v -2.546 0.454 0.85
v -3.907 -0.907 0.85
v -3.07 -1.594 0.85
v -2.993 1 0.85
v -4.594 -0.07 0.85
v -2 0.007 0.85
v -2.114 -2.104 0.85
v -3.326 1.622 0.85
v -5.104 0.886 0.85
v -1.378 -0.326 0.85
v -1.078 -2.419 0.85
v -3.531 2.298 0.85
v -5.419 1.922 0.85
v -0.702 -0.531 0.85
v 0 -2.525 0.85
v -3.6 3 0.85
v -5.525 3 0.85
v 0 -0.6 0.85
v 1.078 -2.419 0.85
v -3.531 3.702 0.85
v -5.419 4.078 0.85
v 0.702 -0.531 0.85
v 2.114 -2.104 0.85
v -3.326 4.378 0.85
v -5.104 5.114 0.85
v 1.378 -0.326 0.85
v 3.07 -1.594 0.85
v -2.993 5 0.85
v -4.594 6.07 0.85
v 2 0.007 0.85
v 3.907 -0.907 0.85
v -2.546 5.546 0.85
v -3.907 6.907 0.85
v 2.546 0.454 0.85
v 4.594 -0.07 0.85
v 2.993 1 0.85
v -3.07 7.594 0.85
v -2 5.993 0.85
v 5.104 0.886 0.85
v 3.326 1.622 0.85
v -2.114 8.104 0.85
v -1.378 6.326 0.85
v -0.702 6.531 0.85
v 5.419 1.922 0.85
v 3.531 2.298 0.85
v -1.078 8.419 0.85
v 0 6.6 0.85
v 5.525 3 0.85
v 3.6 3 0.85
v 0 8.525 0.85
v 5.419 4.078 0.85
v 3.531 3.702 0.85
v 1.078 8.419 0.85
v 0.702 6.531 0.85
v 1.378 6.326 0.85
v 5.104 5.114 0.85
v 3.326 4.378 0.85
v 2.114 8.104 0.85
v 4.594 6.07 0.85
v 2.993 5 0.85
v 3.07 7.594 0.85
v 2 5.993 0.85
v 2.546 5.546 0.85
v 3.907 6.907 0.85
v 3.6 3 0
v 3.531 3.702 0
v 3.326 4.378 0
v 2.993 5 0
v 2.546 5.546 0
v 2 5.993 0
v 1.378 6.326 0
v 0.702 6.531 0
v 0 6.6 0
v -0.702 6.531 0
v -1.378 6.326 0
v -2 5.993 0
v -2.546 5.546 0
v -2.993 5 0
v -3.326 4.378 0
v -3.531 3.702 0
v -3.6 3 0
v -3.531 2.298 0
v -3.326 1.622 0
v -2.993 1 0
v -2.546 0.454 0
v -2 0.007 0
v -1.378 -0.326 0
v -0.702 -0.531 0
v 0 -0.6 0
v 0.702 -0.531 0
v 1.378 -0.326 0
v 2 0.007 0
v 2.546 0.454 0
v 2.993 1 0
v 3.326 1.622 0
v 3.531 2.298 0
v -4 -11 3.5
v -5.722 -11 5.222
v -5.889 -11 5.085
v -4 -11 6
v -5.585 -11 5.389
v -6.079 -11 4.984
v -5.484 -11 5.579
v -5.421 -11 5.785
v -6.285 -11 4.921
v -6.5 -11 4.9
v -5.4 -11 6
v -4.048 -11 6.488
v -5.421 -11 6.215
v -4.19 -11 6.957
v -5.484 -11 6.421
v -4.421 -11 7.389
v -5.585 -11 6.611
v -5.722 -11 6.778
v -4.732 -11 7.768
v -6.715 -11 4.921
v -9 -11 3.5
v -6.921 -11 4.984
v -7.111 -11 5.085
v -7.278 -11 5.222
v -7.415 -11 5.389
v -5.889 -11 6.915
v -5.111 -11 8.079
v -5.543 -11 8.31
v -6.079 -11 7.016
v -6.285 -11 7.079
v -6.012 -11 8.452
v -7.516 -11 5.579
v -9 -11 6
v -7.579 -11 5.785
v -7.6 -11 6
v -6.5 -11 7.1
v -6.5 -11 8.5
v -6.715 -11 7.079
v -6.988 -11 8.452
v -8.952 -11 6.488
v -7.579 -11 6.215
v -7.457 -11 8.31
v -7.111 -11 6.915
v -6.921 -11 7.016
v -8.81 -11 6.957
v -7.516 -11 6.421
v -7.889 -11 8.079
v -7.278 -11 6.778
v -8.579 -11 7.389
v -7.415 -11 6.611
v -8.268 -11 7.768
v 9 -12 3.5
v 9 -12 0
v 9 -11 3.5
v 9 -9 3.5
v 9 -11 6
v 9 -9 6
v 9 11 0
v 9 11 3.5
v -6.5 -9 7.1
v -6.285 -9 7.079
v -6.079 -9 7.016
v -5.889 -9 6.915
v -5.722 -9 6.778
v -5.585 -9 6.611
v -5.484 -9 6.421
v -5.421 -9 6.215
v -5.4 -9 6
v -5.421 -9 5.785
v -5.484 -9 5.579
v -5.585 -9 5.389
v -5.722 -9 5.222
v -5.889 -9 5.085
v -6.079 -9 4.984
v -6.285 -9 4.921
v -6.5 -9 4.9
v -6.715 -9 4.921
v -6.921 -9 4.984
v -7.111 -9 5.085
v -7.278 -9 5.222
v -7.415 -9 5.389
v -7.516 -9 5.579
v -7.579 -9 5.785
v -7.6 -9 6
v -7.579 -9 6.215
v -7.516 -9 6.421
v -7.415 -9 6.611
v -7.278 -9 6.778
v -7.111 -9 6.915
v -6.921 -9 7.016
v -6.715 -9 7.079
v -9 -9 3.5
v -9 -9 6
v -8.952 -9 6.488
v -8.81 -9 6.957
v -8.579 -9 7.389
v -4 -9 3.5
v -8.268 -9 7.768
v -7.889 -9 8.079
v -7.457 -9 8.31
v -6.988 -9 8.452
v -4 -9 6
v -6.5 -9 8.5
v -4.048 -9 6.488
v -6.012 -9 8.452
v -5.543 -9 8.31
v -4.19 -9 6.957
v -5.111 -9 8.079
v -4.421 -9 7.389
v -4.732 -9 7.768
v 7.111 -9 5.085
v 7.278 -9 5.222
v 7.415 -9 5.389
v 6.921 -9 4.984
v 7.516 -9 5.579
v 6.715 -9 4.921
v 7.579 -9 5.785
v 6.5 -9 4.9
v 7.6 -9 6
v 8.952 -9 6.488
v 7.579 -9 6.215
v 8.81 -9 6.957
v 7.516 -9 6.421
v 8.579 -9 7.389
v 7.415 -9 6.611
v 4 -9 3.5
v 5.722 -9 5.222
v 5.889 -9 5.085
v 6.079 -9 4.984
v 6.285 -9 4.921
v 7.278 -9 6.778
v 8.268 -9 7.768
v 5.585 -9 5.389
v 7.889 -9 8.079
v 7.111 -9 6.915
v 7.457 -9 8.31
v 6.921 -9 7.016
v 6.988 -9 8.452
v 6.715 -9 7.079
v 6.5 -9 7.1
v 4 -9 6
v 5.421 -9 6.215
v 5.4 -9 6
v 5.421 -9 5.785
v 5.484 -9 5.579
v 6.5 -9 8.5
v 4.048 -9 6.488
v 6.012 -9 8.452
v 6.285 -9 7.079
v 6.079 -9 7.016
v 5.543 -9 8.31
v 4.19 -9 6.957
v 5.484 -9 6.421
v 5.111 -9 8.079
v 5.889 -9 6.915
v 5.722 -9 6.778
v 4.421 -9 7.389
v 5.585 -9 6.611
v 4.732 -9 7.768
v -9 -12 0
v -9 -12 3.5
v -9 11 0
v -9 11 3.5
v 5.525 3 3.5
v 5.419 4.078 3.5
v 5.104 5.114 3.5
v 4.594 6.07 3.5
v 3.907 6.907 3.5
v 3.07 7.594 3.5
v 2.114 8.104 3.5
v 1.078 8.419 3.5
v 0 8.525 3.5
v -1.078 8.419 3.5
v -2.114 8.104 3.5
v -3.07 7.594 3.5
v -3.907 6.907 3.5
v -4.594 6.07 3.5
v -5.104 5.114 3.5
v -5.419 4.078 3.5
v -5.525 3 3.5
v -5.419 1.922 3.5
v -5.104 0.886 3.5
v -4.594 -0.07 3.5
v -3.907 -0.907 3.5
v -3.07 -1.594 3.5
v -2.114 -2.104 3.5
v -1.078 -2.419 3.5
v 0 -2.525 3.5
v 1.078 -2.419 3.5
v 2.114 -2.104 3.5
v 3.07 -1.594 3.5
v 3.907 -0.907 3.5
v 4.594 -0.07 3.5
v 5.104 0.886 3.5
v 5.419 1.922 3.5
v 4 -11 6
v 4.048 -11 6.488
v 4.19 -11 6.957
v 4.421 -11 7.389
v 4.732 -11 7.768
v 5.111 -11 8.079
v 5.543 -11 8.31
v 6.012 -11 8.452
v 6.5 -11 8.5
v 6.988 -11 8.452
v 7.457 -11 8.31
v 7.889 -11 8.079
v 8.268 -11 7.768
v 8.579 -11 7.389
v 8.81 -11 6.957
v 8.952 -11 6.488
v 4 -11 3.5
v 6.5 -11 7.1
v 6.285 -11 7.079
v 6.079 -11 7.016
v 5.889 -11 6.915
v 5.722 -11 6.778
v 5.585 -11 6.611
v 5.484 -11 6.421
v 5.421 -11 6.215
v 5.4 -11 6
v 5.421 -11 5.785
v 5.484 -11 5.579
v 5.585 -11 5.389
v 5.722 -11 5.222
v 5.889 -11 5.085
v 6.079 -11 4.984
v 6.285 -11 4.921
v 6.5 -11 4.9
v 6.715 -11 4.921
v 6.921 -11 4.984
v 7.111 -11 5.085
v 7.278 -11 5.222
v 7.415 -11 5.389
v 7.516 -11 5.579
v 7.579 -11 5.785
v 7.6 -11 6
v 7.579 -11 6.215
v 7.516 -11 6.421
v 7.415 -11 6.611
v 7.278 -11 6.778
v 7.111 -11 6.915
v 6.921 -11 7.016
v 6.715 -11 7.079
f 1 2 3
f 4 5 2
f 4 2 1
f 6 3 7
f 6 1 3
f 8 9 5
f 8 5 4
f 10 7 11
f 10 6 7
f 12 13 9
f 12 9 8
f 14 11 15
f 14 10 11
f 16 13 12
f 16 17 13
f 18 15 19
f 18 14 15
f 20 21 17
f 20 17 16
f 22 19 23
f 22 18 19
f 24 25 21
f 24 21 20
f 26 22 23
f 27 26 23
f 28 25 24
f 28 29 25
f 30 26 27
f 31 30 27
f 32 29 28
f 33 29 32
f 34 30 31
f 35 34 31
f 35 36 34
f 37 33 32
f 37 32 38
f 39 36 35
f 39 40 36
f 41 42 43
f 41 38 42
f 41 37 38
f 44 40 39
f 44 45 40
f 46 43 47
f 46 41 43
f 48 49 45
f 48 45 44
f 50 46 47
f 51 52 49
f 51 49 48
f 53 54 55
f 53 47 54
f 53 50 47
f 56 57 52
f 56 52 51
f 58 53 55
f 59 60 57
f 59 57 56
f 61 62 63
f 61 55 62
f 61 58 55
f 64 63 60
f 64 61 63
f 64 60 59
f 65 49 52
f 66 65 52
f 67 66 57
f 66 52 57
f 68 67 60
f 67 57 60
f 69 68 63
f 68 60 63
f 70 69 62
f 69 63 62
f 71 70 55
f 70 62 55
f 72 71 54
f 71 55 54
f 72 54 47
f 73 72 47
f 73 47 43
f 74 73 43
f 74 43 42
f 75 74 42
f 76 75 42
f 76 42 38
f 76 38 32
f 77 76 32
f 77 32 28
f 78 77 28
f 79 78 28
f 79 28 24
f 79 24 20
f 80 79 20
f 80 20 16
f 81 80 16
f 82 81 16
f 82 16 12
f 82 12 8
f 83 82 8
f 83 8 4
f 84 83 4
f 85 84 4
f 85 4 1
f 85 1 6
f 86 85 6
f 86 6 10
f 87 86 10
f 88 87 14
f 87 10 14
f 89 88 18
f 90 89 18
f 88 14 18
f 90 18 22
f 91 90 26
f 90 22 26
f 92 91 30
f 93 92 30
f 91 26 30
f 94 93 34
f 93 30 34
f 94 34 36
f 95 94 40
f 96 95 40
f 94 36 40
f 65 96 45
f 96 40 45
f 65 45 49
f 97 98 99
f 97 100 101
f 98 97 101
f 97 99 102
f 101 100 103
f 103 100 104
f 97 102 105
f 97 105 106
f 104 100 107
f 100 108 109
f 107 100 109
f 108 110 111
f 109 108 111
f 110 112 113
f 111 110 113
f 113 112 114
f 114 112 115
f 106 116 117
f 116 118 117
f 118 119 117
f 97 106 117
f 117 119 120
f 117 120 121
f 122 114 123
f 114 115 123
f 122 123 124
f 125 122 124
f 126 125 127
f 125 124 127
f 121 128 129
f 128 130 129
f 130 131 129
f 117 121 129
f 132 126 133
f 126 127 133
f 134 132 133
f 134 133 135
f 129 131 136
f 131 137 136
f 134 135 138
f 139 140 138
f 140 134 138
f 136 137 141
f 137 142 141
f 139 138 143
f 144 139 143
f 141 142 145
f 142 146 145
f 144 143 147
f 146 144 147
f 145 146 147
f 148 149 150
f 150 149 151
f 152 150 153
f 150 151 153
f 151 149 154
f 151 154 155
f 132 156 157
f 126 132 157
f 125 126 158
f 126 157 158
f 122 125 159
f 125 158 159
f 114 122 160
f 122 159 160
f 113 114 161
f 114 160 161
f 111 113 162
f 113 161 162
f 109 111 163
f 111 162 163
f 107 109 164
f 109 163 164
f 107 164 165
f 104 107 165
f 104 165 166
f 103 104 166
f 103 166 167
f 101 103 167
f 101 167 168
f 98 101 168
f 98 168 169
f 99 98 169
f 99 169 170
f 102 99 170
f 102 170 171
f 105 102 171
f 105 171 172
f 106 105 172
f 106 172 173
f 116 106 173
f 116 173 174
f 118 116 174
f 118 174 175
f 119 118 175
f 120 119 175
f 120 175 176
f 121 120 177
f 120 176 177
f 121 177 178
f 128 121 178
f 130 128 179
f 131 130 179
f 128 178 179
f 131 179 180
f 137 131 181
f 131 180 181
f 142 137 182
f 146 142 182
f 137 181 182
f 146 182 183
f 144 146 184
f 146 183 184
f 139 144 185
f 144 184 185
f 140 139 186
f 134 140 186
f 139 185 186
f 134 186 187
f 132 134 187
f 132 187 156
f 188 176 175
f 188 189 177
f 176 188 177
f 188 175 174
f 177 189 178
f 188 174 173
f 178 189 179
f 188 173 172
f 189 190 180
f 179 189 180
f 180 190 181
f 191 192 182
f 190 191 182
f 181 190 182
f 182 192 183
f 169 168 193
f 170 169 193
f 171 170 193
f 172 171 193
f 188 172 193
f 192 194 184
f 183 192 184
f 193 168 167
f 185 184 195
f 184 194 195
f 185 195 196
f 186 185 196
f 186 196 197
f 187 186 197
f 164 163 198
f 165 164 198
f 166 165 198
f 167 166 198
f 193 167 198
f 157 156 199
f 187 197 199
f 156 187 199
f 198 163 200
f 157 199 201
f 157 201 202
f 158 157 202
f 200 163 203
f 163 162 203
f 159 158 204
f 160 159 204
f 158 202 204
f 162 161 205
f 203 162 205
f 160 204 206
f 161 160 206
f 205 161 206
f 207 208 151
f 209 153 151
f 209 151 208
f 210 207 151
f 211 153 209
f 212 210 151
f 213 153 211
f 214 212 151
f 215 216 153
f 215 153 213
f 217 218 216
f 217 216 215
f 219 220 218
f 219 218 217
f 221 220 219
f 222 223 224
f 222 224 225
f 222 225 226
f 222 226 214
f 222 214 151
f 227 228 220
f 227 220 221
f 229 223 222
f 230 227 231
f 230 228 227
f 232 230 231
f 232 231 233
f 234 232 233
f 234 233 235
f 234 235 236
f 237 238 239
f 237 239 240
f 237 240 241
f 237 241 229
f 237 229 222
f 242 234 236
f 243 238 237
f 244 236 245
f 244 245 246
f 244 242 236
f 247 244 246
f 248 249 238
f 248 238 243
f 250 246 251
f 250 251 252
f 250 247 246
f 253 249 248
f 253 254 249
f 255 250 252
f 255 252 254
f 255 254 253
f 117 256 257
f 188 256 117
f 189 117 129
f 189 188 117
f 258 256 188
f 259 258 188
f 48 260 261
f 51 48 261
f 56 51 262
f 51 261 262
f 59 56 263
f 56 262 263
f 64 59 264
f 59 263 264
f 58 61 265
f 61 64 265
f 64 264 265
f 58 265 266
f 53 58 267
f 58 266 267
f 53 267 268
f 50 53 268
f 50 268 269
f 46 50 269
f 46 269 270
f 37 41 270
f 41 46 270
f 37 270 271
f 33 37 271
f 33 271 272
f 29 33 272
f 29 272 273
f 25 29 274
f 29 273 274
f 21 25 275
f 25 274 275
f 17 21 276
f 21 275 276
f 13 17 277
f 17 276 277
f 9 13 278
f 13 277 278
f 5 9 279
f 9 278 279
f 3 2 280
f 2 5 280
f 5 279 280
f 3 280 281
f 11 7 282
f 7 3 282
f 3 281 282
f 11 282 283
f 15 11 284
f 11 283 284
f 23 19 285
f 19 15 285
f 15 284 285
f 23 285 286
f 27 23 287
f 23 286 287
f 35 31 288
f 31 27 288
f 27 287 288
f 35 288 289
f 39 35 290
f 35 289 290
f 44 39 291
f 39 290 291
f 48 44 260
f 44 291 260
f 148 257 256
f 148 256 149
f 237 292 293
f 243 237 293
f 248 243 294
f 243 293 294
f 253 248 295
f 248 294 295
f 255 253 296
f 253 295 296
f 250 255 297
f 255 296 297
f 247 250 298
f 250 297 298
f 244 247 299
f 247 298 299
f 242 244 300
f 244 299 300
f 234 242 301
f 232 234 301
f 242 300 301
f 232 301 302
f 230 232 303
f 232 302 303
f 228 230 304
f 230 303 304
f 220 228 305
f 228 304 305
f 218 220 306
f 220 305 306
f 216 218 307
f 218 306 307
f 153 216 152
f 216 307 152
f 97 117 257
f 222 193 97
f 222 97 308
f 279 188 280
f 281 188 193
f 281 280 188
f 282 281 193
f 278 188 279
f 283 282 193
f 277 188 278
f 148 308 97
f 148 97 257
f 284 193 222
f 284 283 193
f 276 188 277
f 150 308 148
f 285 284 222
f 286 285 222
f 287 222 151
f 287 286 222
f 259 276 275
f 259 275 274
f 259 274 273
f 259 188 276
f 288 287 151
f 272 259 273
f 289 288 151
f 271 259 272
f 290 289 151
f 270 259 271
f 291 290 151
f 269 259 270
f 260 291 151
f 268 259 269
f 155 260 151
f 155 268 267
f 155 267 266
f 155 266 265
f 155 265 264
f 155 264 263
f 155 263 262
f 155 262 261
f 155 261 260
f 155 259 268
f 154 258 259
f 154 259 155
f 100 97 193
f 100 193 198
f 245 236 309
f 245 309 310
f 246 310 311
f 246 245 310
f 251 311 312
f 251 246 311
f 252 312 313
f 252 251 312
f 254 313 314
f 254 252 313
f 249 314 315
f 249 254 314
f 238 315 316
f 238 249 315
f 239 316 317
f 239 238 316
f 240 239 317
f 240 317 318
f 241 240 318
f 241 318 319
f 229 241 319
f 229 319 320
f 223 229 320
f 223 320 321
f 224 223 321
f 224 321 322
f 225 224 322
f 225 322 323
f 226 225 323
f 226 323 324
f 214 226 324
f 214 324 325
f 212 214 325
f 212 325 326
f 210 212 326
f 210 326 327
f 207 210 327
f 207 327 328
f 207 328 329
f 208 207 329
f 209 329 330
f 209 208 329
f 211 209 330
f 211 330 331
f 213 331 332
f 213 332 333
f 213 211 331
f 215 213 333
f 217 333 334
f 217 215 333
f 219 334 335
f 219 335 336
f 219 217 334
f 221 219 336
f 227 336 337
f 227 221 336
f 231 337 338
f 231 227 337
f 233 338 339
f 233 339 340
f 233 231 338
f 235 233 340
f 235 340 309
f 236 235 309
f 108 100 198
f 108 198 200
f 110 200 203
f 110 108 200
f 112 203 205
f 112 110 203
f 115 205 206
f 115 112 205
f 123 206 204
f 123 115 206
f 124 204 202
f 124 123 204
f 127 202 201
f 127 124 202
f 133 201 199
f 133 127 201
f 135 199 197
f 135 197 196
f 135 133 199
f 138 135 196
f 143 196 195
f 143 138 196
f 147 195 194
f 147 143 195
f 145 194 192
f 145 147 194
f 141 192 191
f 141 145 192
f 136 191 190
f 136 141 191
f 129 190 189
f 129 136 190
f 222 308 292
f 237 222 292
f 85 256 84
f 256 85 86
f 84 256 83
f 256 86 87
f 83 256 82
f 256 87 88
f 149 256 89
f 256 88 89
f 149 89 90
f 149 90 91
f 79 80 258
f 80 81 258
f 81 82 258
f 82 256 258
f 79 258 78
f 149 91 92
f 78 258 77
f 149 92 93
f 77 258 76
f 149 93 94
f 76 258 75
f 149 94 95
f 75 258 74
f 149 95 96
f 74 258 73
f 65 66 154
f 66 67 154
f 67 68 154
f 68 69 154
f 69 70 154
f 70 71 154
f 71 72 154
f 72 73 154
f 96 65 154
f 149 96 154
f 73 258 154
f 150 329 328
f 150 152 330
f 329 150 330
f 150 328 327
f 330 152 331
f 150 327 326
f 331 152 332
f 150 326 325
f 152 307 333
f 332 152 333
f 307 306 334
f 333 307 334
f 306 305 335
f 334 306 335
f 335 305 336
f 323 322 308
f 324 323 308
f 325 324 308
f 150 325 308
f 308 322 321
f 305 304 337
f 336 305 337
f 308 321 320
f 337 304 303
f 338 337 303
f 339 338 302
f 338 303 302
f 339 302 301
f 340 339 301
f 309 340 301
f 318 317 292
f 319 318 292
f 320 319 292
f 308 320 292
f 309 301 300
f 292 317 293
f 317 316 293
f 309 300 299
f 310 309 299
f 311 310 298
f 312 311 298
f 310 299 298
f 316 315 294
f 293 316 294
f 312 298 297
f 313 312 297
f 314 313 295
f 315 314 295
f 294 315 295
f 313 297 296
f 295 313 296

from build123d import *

# Parameters (mm, degrees)
SKETCH_1_W          = 18
SKETCH_1_H          = 22
EXTRUDE_1_DEPTH     = 3.5
SKETCH_2_R          = 3.6
CUT_EXTRUDE_1_DEPTH = 3.5
SKETCH_3_R          = 5.525
CUT_EXTRUDE_2_DEPTH = 2.65
SKETCH_4_W          = 5
SKETCH_4_H          = 5
EXTRUDE_2_DEPTH     = 2
FILLET_1_RADIUS     = 2.5
FILLET_1_LENGTH     = 2
SKETCH_5_R          = 1.1
CUT_EXTRUDE_3_DEPTH = 3
SKETCH_6_W          = 18
SKETCH_6_H          = 3.5
EXTRUDE_3_DEPTH     = 1


with BuildPart() as part:
    # 草图1 → 凸台-拉伸1 (new body)
    with BuildSketch(Plane.XY):
        Rectangle(SKETCH_1_W, SKETCH_1_H)
    extrude(amount=EXTRUDE_1_DEPTH)

    # 草图2 → 切除-拉伸1 (cut)
    with BuildSketch(Plane.XY.offset(3.5)):
        with Locations((0, 3)):
            Circle(SKETCH_2_R)
    extrude(amount=-CUT_EXTRUDE_1_DEPTH, mode=Mode.SUBTRACT)

    # 草图3 → 切除-拉伸2 (cut)
    with BuildSketch(Plane.XY.offset(3.5)):
        with Locations((0, 3)):
            Circle(SKETCH_3_R)
    extrude(amount=-CUT_EXTRUDE_2_DEPTH, mode=Mode.SUBTRACT)

    # 草图4 → 凸台-拉伸2 (add)
    with BuildSketch(Plane.XZ.offset(11)):
        with Locations((-6.5, 6)):
            Rectangle(SKETCH_4_W, SKETCH_4_H)
    extrude(amount=-EXTRUDE_2_DEPTH)

    # 圆角1: full round fillet: the end face becomes a half cylinder, R = half its width
    fillet_1_face = Plane((-6.5, -10, 8.5), x_dir=(0, -1, 0), z_dir=(0, 0, 1))  # on the end face: x along it, z out of the body
    fillet_1_slab = fillet_1_face.offset(-FILLET_1_RADIUS / 2) * Box(FILLET_1_LENGTH, 2 * FILLET_1_RADIUS, FILLET_1_RADIUS, mode=Mode.PRIVATE)  # the body's end, R deep
    fillet_1_round = Plane((-6.5, -10, 6), x_dir=(0, 0, 1), z_dir=(0, -1, 0)) * Cylinder(FILLET_1_RADIUS, FILLET_1_LENGTH, mode=Mode.PRIVATE)  # its axis R under the face
    add(fillet_1_slab - fillet_1_round, mode=Mode.SUBTRACT)

    # 草图5 → 切除-拉伸3 (cut)
    with BuildSketch(Plane(origin=(0, -9, 0), x_dir=(1, 0, 0), z_dir=(0, 1, 0))):
        with Locations(Location((-6.5, -6, 0), (0, 0, 270))):
            Circle(SKETCH_5_R)
    extrude(amount=-CUT_EXTRUDE_3_DEPTH, mode=Mode.SUBTRACT)

    # 镜向6: part across plane


with BuildPart() as part_1:
    add(part.part)
    add(part.part.mirror(Plane.ZY))

    # 草图6 → 凸台-拉伸3 (add)
    with BuildSketch(Plane.XZ.offset(11)):
        with Locations((0, 1.75)):
            Rectangle(SKETCH_6_W, SKETCH_6_H)
    extrude(amount=EXTRUDE_3_DEPTH)


solid = part_1.part
